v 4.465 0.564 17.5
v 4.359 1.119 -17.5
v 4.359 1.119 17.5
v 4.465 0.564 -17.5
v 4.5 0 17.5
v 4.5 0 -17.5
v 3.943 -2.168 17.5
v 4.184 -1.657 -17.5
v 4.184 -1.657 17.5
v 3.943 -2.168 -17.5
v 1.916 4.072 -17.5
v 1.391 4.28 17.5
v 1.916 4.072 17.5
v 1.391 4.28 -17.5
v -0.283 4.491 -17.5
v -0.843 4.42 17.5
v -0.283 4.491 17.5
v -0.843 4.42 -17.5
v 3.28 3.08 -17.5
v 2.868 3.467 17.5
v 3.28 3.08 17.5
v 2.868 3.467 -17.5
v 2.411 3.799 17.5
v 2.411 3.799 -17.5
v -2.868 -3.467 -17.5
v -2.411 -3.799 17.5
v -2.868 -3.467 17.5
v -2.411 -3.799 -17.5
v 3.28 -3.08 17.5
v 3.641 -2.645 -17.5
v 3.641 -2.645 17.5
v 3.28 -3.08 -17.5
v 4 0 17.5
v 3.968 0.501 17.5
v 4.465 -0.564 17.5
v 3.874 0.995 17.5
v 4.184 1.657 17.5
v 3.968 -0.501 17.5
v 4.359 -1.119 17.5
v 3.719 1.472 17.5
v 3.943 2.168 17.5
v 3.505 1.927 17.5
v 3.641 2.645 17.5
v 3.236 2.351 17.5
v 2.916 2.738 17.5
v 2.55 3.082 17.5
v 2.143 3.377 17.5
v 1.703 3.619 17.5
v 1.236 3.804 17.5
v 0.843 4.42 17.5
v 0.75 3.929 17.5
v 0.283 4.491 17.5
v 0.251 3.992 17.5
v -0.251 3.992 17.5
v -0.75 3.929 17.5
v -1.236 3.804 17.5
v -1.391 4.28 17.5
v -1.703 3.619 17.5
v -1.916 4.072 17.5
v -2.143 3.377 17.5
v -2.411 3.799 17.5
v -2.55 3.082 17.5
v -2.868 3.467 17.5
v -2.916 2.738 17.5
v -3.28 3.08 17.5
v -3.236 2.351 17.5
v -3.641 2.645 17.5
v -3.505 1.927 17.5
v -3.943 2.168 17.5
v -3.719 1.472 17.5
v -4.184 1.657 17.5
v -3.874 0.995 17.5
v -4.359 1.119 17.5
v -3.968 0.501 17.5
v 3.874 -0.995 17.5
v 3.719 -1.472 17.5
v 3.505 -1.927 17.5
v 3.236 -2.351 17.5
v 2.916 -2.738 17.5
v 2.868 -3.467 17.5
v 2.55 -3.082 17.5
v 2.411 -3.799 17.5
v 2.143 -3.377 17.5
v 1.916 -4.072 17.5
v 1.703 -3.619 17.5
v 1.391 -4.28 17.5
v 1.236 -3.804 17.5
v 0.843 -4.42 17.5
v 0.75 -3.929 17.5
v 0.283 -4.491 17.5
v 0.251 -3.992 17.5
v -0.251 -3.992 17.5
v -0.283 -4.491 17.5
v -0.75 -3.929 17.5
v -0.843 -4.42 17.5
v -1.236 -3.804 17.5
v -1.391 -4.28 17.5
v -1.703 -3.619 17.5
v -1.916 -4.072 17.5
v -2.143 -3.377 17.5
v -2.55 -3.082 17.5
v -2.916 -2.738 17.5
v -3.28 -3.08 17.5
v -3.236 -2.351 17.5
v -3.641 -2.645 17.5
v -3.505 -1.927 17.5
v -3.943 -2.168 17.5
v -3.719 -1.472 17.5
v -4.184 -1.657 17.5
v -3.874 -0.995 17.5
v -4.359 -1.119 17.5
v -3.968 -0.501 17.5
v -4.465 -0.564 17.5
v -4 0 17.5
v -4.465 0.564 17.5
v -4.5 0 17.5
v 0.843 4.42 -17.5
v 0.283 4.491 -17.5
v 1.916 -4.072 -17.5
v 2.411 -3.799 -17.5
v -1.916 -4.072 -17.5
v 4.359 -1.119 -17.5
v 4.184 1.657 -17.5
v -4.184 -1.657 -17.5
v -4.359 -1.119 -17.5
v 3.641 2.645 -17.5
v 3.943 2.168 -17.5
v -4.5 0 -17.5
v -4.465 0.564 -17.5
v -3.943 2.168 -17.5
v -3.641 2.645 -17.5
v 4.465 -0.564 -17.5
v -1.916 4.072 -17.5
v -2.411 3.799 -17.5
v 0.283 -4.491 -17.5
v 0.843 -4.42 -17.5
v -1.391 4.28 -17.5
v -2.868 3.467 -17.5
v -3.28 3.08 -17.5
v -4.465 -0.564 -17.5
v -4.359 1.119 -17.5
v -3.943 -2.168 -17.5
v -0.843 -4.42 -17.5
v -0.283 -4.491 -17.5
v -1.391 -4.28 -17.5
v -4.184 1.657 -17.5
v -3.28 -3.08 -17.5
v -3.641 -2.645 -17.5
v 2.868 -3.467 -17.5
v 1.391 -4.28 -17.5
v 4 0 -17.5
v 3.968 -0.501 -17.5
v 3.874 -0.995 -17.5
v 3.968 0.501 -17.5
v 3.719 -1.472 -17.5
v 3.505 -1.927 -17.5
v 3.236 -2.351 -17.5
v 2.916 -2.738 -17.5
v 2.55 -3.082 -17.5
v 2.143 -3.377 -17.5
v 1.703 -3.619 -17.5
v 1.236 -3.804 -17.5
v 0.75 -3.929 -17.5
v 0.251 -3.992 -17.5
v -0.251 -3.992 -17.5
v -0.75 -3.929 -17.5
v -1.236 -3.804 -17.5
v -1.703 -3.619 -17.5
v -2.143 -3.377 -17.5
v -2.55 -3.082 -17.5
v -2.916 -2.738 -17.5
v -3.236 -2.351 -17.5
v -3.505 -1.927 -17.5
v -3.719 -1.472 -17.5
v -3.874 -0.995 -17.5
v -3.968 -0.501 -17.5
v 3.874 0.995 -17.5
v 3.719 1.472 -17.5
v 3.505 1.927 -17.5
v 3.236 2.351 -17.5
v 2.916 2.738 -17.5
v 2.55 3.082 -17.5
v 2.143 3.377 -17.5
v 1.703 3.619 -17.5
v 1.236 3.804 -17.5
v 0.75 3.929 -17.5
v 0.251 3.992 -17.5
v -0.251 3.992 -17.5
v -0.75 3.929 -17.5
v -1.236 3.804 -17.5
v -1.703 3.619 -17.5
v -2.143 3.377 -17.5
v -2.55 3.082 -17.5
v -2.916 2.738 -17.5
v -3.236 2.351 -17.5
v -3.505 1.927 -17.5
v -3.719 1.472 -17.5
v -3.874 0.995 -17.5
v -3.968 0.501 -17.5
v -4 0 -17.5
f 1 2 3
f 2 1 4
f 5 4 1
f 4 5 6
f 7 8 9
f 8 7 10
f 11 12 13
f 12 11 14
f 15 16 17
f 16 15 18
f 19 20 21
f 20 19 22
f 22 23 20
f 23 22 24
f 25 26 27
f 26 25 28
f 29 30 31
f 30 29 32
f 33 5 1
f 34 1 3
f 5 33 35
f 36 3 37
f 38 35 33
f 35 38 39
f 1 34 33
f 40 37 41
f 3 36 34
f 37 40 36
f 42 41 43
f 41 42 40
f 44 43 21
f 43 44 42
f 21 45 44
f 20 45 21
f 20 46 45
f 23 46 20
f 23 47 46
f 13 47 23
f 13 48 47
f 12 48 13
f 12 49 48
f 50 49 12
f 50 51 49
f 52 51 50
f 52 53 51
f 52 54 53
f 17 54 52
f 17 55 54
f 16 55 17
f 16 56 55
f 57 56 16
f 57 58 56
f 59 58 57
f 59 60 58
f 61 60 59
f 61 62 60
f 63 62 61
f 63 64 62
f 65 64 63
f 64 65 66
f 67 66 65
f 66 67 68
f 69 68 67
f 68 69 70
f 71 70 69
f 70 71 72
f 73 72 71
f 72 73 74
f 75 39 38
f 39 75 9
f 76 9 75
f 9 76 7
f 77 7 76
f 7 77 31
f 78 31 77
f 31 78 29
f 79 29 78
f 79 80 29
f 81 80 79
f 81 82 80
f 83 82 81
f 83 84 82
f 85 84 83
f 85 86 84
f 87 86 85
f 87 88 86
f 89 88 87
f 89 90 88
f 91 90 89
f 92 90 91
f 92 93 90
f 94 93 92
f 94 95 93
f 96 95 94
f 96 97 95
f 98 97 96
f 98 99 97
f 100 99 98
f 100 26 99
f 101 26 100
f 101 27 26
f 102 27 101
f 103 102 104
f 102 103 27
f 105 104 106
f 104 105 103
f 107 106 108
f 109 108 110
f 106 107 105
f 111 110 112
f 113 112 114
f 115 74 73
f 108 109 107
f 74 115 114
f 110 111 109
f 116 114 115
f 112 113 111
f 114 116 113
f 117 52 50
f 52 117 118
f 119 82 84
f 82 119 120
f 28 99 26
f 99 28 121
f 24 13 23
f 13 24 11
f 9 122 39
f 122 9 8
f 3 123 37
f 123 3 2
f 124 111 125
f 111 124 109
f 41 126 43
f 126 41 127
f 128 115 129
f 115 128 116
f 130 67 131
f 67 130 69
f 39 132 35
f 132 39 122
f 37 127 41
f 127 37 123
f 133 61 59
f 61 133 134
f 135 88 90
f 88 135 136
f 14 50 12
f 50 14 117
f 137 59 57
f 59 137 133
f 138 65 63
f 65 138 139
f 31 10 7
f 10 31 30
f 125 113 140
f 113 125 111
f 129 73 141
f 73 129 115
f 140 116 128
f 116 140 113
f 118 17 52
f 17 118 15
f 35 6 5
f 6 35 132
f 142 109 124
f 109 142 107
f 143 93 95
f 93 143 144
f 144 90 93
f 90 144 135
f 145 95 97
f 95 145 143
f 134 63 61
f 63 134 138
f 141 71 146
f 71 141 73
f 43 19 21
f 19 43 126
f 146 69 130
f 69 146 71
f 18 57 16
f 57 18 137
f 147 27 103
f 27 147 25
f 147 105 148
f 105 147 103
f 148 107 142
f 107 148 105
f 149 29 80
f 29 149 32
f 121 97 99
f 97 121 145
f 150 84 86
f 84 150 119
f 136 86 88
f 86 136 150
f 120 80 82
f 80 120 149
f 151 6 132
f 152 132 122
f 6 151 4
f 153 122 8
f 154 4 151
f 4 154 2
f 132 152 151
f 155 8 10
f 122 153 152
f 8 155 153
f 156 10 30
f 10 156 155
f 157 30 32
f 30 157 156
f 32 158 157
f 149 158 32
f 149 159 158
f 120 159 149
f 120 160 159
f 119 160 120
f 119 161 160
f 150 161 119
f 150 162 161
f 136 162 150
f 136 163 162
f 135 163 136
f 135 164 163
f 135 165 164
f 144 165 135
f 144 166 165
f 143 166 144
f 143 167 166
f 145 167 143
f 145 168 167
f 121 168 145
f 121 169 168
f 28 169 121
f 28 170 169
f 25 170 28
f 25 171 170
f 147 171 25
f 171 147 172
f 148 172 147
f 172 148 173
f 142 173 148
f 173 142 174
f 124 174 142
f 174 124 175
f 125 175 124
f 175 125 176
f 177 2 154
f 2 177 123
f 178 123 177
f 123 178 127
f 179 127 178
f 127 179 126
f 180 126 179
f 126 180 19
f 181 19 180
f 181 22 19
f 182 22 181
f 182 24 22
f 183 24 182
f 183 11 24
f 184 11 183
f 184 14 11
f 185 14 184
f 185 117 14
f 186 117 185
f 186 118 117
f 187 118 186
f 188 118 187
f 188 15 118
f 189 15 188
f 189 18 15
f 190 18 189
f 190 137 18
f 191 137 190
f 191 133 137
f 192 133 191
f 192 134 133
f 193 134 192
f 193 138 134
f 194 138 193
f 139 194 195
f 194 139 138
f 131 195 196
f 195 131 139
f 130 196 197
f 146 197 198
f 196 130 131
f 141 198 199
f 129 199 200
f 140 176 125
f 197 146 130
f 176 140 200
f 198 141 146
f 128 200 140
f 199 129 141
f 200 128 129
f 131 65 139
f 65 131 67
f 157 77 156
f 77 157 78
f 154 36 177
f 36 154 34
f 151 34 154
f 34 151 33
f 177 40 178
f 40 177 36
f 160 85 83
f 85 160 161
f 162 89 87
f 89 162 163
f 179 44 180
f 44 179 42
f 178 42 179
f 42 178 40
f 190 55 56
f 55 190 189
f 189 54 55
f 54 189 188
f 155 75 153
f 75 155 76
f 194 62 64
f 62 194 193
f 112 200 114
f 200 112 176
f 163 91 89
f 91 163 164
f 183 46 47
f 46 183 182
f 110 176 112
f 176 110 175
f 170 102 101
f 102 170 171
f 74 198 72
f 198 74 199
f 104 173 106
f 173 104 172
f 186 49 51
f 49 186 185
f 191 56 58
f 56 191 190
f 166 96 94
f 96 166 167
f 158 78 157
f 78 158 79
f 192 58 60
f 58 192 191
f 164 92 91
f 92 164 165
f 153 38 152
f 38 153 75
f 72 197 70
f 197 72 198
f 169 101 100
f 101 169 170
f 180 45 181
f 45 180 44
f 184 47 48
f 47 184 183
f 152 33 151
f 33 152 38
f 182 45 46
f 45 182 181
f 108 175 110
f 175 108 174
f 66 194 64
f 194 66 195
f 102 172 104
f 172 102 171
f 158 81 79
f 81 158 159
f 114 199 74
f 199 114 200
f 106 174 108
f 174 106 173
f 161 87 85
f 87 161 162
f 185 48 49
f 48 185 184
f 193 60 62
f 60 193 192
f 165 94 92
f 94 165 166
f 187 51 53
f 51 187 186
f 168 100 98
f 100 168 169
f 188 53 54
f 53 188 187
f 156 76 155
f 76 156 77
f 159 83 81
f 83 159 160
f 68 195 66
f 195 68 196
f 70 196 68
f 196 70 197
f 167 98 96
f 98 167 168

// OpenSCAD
$fn = 50;


difference() {
	union() {
		translate(v = [0, 0, -17.5000000000]) {
			cylinder(h = 35, r = 4.5000000000);
		}
	}
	union() {
		translate(v = [0, 0, -100.0000000000]) {
			cylinder(h = 200, r = 4.0000000000);
		}
	}
}
